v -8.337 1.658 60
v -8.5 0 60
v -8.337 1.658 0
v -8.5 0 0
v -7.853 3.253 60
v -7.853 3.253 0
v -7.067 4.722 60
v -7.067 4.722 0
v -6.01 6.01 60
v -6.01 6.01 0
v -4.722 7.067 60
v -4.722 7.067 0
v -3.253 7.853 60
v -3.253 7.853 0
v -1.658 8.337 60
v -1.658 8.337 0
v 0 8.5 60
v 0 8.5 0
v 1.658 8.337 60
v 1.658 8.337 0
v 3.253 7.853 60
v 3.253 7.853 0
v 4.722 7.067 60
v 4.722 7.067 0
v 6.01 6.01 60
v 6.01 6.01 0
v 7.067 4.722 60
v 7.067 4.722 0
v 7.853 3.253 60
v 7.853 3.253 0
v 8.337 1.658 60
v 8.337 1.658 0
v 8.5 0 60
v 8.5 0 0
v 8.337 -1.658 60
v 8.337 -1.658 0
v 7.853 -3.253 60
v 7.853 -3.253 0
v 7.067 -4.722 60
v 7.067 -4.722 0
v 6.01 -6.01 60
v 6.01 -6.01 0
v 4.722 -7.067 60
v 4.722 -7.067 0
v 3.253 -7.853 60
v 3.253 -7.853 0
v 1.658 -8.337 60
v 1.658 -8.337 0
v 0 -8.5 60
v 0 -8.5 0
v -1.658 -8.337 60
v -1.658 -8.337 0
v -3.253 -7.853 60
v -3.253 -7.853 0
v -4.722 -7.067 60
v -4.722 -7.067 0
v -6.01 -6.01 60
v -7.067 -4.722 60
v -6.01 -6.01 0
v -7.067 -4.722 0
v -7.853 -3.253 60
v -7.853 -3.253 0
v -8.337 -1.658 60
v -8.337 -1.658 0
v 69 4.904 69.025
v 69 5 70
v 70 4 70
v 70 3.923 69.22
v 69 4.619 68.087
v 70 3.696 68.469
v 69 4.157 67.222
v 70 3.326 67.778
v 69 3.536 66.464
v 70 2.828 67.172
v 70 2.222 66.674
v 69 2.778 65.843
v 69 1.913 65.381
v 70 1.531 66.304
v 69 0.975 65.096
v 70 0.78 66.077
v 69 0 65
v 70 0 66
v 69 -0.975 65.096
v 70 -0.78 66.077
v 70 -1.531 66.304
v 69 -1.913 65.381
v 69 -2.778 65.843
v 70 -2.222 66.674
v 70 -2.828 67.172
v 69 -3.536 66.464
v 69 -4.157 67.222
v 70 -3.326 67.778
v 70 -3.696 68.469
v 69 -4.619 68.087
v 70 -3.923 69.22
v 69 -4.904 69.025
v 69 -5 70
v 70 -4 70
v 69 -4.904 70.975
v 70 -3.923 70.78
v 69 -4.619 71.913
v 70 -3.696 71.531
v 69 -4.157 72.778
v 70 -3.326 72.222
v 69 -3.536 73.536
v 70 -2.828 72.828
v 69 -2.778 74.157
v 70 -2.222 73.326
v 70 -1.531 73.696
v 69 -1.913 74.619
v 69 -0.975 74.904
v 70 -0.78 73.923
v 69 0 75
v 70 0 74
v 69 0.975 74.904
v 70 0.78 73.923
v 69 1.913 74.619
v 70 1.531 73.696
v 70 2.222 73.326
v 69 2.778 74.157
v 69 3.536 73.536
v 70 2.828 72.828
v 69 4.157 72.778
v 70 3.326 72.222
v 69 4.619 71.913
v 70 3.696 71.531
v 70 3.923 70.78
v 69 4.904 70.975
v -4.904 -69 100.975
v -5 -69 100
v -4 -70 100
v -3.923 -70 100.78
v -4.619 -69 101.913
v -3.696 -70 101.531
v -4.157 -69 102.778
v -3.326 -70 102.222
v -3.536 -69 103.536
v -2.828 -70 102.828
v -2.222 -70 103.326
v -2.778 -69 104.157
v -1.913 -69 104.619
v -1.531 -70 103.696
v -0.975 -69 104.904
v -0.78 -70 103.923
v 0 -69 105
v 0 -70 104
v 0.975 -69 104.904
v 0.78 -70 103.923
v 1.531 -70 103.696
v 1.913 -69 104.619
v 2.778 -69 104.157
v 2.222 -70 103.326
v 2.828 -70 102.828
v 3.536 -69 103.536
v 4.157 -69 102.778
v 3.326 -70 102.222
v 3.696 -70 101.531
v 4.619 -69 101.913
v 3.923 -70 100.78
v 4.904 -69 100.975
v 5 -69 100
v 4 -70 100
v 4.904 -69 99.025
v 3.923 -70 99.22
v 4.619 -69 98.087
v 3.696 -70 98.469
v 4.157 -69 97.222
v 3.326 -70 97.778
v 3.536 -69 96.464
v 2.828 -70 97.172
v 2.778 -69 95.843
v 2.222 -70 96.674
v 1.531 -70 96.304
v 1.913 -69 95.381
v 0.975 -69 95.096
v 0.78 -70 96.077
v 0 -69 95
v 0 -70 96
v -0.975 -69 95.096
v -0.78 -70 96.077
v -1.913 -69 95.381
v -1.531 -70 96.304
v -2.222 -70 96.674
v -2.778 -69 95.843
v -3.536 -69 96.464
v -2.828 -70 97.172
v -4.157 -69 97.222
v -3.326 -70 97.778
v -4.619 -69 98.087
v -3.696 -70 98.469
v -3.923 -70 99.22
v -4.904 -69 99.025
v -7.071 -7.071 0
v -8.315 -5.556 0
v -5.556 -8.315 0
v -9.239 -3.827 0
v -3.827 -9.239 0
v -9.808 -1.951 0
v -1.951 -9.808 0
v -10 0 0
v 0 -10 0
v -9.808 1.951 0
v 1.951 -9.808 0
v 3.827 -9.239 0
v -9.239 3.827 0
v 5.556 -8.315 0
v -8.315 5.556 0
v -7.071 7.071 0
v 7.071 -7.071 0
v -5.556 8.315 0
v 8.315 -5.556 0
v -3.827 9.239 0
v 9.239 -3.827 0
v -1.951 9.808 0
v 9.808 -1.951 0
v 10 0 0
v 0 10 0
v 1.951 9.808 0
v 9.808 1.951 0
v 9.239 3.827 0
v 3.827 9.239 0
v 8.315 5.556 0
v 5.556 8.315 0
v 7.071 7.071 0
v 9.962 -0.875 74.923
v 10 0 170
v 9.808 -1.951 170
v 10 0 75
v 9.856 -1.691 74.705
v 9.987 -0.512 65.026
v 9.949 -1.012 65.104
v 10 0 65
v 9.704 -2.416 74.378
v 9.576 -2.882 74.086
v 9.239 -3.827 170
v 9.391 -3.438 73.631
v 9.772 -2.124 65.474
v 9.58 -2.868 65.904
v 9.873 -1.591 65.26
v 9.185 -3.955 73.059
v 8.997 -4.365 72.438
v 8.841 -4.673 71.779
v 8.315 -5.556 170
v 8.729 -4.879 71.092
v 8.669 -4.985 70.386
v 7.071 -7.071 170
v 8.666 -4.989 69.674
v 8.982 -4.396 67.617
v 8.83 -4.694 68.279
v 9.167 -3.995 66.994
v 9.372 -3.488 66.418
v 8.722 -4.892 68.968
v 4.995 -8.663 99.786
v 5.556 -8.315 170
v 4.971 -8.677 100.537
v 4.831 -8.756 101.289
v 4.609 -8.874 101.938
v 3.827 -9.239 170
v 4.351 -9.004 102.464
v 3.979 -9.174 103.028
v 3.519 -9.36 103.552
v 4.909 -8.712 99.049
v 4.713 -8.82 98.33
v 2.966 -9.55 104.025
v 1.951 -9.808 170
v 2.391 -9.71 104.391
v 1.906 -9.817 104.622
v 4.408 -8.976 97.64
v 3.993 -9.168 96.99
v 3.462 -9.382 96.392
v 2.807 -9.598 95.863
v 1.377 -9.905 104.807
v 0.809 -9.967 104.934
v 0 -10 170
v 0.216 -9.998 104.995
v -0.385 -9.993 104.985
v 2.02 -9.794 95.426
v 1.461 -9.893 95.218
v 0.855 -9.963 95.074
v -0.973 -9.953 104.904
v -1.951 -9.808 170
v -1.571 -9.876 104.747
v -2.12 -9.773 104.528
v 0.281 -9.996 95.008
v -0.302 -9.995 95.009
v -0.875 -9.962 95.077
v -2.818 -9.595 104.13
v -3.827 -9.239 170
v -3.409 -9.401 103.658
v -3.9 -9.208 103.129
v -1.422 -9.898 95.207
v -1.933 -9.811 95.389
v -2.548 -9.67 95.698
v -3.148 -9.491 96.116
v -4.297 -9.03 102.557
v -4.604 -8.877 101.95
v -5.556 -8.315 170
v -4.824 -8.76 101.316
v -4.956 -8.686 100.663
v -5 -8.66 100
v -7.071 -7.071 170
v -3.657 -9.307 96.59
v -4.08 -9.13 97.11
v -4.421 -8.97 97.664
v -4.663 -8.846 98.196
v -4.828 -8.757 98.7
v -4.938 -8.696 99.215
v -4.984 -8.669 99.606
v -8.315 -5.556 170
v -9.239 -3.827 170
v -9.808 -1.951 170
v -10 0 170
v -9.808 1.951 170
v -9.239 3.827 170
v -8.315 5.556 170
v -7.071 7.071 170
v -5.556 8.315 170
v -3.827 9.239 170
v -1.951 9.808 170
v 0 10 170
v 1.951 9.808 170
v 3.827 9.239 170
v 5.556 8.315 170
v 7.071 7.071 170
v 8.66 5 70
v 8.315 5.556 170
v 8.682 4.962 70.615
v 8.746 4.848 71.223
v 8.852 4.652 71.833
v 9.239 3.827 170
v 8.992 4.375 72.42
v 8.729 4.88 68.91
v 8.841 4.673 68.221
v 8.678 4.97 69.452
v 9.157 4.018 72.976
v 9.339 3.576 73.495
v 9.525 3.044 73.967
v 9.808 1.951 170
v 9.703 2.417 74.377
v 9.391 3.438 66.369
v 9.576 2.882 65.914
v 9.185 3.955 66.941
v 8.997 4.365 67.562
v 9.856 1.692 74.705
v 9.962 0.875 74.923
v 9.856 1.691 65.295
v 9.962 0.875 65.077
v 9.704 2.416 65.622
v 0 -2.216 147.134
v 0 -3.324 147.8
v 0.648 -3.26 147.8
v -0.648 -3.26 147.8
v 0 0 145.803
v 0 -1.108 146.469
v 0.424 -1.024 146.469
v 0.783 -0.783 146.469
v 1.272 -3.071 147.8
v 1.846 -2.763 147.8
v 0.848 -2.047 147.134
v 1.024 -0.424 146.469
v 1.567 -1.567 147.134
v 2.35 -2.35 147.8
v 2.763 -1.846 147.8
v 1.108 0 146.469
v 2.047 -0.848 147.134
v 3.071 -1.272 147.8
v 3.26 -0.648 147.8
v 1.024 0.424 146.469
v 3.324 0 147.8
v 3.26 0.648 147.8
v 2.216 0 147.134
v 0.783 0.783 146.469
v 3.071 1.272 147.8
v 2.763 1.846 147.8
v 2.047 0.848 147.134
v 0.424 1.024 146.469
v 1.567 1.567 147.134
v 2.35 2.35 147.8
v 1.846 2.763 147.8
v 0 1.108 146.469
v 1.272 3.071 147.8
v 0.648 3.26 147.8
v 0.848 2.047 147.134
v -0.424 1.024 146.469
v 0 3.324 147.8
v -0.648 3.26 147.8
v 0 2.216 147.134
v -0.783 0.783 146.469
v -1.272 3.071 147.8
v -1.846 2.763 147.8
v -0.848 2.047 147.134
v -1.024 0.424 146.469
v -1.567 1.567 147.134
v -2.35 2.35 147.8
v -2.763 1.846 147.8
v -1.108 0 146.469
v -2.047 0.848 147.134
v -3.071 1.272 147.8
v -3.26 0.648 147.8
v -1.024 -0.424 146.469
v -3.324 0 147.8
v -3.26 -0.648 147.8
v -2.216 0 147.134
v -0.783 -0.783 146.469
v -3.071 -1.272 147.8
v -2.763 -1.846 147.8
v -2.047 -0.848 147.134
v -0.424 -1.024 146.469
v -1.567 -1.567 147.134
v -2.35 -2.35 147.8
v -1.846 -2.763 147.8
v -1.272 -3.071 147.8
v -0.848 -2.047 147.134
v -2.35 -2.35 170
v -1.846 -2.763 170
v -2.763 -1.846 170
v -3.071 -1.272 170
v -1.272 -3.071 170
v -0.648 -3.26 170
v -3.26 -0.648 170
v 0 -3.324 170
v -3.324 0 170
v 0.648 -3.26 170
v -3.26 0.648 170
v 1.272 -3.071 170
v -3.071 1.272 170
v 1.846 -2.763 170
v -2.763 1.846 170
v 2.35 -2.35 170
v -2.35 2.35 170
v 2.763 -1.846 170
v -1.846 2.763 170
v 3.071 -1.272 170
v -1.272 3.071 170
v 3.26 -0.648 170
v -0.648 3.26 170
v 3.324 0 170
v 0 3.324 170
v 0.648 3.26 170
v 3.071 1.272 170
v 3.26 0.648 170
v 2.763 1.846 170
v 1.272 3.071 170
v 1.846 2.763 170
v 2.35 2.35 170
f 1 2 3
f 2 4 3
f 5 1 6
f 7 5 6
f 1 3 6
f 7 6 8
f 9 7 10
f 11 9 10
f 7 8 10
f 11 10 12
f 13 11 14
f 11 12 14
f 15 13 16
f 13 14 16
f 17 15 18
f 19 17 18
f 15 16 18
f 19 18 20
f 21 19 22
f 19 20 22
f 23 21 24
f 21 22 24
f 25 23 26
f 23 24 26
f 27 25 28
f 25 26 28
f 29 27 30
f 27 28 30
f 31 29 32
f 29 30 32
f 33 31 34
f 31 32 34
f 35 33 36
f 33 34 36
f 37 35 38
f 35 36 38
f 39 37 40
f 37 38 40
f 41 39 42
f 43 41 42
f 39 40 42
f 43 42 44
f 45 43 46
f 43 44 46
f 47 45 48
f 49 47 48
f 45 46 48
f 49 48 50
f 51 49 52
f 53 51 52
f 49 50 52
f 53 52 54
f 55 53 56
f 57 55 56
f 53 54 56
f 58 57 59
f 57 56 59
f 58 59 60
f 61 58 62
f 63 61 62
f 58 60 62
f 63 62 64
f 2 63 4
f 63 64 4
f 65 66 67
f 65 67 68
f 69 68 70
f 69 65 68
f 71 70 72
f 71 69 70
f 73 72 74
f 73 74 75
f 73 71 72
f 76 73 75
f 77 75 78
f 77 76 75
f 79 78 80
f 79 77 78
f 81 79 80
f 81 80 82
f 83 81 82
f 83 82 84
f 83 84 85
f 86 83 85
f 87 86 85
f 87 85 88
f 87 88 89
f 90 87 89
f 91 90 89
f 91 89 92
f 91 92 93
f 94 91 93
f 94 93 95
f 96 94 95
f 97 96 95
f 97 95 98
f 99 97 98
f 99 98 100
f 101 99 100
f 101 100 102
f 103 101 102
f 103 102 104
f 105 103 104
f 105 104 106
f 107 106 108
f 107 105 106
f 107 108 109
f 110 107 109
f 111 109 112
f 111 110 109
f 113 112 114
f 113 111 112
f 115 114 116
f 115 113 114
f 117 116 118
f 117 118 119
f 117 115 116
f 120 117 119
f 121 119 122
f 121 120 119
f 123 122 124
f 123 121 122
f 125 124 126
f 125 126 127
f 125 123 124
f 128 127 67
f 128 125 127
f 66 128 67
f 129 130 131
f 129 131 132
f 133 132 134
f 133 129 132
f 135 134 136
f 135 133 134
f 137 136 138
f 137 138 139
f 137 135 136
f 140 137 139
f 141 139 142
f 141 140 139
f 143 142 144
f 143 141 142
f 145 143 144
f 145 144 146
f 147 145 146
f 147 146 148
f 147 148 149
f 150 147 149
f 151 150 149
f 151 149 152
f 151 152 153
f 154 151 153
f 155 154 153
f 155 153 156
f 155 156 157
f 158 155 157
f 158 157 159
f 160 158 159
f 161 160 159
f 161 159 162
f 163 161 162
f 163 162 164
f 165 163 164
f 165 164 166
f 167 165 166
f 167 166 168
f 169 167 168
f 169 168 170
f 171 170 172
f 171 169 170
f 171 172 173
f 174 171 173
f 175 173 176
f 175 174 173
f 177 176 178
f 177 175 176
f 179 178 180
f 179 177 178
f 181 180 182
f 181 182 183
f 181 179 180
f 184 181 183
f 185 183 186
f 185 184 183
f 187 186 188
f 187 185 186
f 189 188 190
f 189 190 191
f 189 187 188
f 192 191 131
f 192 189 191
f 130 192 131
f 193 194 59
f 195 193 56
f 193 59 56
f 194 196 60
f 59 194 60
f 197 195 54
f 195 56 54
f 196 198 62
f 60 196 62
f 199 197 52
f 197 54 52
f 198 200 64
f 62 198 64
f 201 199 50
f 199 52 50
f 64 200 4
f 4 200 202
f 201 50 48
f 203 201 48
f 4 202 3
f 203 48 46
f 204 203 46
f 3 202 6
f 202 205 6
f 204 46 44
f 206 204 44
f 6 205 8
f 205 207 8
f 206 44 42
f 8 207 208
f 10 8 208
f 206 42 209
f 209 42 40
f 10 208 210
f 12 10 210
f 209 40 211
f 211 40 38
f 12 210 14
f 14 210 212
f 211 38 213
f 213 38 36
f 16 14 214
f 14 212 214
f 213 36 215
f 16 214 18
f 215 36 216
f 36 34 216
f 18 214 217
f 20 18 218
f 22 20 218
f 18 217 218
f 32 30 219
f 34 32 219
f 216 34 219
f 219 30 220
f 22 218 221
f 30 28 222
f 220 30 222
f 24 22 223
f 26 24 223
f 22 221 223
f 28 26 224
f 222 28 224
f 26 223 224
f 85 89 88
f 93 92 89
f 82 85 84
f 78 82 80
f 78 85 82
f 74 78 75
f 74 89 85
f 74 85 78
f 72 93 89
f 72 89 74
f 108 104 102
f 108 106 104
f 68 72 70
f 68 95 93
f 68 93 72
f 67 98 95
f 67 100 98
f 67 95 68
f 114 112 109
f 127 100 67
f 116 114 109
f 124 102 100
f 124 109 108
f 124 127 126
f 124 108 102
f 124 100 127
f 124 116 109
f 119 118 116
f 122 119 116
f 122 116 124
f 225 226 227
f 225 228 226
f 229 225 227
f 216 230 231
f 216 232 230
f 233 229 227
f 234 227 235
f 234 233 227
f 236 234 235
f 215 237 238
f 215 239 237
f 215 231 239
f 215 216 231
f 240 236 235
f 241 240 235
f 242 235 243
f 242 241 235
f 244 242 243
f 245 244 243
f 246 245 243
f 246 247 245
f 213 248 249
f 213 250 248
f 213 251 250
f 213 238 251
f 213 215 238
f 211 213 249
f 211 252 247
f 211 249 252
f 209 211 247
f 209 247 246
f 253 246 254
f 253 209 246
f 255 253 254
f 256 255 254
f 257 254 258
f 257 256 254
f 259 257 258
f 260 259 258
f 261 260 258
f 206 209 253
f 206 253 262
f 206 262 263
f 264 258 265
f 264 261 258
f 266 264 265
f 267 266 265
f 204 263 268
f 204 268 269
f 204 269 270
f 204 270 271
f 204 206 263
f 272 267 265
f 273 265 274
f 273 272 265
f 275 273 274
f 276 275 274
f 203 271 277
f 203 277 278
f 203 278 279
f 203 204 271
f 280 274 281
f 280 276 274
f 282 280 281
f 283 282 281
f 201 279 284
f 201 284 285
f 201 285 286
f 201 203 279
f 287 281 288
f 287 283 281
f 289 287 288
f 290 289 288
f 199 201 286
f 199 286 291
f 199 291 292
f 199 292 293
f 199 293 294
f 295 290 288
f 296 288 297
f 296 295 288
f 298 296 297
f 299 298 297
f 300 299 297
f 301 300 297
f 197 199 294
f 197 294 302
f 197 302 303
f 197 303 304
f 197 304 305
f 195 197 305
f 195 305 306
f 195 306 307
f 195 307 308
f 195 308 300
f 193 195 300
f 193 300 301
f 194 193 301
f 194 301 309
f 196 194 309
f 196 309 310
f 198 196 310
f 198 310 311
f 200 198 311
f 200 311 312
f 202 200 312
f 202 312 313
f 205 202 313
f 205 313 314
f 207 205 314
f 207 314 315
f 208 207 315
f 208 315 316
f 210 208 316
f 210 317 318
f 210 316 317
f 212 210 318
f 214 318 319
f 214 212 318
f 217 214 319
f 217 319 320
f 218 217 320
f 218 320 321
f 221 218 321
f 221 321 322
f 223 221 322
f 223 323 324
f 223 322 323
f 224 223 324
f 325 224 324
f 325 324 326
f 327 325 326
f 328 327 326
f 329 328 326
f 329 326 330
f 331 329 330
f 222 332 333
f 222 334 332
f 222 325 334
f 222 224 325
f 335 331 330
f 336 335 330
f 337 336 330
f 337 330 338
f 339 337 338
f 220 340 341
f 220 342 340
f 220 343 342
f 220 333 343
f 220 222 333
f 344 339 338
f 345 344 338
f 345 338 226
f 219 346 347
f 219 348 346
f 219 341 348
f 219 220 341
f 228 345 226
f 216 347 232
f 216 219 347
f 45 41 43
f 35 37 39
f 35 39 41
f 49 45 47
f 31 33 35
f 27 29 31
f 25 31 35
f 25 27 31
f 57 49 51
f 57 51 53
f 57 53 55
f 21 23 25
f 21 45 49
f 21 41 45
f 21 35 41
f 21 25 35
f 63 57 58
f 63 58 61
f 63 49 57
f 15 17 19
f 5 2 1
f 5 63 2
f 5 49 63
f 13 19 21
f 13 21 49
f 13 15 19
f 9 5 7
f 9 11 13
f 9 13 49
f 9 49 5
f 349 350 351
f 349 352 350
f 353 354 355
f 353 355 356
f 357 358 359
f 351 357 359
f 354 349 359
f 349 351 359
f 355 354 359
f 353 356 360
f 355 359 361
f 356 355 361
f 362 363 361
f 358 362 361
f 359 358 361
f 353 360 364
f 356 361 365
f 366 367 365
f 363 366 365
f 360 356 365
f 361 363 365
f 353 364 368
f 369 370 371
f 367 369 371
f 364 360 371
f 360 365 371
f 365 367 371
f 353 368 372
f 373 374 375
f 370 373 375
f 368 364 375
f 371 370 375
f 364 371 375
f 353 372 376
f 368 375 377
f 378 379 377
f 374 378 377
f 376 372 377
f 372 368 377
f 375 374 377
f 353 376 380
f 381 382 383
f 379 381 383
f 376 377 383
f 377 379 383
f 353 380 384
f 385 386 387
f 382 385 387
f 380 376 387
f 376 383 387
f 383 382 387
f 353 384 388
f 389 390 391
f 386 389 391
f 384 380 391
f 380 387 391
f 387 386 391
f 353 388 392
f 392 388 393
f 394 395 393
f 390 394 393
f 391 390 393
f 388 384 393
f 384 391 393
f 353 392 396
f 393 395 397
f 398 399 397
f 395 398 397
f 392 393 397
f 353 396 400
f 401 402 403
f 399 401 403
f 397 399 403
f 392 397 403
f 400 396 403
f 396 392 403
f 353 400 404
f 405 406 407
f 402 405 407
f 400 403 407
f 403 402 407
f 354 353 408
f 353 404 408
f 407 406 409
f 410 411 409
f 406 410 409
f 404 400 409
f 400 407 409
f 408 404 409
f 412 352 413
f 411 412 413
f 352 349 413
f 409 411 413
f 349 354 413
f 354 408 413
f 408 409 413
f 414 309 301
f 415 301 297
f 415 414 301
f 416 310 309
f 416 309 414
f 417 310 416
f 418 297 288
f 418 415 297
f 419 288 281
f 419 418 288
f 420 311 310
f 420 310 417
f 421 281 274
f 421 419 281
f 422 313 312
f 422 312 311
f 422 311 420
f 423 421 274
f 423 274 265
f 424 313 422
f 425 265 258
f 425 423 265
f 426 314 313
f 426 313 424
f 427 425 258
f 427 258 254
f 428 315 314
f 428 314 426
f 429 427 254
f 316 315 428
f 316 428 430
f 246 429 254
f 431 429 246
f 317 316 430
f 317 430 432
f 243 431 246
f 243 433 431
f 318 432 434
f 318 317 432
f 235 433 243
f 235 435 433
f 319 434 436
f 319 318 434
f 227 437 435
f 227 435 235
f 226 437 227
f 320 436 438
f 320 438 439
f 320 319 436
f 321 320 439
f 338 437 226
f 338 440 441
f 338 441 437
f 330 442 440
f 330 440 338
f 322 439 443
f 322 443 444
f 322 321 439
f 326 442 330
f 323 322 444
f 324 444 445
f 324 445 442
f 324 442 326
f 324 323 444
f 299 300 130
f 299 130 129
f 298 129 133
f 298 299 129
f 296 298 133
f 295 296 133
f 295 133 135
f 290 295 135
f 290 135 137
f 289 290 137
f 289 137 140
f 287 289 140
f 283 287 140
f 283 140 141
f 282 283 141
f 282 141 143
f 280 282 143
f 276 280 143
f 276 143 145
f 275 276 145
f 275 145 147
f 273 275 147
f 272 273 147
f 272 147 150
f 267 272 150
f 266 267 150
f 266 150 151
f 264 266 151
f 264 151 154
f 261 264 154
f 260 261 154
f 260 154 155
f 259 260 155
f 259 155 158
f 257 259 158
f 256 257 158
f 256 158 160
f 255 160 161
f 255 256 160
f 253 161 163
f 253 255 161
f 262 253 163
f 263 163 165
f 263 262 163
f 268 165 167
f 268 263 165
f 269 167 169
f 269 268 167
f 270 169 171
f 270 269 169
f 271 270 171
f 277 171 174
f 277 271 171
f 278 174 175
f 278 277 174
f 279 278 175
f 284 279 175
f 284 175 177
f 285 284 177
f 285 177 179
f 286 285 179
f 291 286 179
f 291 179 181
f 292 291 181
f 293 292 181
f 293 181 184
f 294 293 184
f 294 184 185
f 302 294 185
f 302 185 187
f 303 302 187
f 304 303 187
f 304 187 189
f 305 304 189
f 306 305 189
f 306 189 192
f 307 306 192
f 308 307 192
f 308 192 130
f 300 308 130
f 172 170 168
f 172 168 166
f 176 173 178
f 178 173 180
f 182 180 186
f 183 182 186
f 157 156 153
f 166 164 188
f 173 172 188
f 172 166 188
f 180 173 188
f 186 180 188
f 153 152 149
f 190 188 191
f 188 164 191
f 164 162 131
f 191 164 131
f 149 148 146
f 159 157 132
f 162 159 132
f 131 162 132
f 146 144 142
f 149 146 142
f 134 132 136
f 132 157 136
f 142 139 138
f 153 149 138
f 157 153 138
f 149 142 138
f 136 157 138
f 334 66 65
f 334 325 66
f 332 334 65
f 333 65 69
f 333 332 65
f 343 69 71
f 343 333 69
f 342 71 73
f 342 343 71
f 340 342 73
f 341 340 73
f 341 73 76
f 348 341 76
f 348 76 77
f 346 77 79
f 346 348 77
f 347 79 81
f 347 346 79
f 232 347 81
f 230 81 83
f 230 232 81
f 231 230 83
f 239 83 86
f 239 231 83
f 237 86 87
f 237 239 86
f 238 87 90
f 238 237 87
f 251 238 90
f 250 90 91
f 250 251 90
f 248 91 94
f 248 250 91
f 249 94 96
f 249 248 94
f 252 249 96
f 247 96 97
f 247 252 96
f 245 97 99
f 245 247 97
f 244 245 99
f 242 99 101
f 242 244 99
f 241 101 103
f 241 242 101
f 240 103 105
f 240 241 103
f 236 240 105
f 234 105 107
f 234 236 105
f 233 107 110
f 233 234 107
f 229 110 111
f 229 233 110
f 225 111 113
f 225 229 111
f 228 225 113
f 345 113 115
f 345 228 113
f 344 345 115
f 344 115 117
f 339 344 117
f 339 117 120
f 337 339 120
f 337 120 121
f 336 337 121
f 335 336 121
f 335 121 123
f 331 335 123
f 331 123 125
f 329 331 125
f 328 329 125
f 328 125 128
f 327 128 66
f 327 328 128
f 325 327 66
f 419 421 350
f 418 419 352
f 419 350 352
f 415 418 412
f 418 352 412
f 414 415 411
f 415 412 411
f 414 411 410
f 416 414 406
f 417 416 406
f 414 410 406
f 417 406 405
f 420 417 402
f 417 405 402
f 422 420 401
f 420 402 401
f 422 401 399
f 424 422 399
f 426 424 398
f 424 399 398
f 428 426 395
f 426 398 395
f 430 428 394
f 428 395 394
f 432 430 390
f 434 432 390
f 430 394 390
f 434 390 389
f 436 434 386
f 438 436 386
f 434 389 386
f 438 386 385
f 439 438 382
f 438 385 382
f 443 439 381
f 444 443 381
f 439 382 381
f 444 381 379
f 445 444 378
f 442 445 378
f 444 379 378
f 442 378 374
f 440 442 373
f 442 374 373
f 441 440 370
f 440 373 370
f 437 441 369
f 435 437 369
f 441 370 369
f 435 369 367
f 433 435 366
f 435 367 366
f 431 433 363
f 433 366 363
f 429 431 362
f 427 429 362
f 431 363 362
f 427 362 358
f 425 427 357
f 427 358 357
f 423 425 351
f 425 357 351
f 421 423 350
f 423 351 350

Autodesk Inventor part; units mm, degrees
ref_plane "YZ Plane" through (0, 0, 0) normal (1, 0, 0) x (0, 1, 0)
ref_plane "XZ Plane" through (0, 0, 0) normal (0, 1, 0) x (-1, 0, 0)
ref_plane "XY Plane" through (0, 0, 0) normal (0, 0, 1) x (1, 0, 0)
sketch "Skizze1" plane through (0, 0, 0) normal (0, 0, 1) x (1, 0, 0)
  circle A0 centre (0, 0) radius 10
  dimension "d0" = 20
extrude "Extrusion1" add sketch "Skizze1" along normal blind 170
sketch "Skizze5" plane through (0, 0, 0) normal (0, 1, 0) x (-1, 0, 0)
  circle A0 centre (0, 100) radius 5
  line L0 (0, -21) -> (0, 126) projected
  line L1 (7, 0) -> (-7, 0) projected
  point P0 (0, 0)
  dimension "d11" = 10
  dimension "d12" = 0
  dimension "d13" = 100
extrude "Extrusion4" add sketch "Skizze5" against normal blind 70
sketch "Skizze6" plane through (0, 0, 0) normal (1, 0, 0) x (0, 1, 0)
  line L0 (10, 170) -> (-10, 170) projected
  line L1 (0, 170) -> (0, 70)
  circle A0 centre (0, 70) radius 5
  point P0 (0, 0)
  dimension "d17" = 100
  dimension "d18" = 10
extrude "Extrusion5" add sketch "Skizze6" along normal blind 70
sketch "Skizze7" plane through (0, 0, 0) normal (0, 0, -1) x (-1, 0, 0)
  circle A0 centre (0, 0) radius 8.5
extrude "Extrusion6" cut sketch "Skizze7" against normal blind 60
thread "Gewinde1" size "M10x1.5" class "6g" standard "ANSI Metric M Profile" length 20
thread "Gewinde2" size "M10x1.5" class "6g" standard "ANSI Metric M Profile" length 20
chamfer "Fasen1" distance 1 angle 45 1 edges at (5, -70, 100)
chamfer "Fasen2" distance 1 angle 45 1 edges at (70, -5, 70)
sketch "Skizze8" plane through (0, 0, 170) normal (0, 0, 1) x (1, 0, 0)
  point P0 (0, 0)
hole "Bohrung1" at (0, 0, 170) direction (0, 0, -1) diameter 6.647 depth 22.2 tip angle 118 thread size "M8x1.25" class "6H" standard "ISO Metric profile"
properties part number "HTW-000681" material "Edelstahl"
